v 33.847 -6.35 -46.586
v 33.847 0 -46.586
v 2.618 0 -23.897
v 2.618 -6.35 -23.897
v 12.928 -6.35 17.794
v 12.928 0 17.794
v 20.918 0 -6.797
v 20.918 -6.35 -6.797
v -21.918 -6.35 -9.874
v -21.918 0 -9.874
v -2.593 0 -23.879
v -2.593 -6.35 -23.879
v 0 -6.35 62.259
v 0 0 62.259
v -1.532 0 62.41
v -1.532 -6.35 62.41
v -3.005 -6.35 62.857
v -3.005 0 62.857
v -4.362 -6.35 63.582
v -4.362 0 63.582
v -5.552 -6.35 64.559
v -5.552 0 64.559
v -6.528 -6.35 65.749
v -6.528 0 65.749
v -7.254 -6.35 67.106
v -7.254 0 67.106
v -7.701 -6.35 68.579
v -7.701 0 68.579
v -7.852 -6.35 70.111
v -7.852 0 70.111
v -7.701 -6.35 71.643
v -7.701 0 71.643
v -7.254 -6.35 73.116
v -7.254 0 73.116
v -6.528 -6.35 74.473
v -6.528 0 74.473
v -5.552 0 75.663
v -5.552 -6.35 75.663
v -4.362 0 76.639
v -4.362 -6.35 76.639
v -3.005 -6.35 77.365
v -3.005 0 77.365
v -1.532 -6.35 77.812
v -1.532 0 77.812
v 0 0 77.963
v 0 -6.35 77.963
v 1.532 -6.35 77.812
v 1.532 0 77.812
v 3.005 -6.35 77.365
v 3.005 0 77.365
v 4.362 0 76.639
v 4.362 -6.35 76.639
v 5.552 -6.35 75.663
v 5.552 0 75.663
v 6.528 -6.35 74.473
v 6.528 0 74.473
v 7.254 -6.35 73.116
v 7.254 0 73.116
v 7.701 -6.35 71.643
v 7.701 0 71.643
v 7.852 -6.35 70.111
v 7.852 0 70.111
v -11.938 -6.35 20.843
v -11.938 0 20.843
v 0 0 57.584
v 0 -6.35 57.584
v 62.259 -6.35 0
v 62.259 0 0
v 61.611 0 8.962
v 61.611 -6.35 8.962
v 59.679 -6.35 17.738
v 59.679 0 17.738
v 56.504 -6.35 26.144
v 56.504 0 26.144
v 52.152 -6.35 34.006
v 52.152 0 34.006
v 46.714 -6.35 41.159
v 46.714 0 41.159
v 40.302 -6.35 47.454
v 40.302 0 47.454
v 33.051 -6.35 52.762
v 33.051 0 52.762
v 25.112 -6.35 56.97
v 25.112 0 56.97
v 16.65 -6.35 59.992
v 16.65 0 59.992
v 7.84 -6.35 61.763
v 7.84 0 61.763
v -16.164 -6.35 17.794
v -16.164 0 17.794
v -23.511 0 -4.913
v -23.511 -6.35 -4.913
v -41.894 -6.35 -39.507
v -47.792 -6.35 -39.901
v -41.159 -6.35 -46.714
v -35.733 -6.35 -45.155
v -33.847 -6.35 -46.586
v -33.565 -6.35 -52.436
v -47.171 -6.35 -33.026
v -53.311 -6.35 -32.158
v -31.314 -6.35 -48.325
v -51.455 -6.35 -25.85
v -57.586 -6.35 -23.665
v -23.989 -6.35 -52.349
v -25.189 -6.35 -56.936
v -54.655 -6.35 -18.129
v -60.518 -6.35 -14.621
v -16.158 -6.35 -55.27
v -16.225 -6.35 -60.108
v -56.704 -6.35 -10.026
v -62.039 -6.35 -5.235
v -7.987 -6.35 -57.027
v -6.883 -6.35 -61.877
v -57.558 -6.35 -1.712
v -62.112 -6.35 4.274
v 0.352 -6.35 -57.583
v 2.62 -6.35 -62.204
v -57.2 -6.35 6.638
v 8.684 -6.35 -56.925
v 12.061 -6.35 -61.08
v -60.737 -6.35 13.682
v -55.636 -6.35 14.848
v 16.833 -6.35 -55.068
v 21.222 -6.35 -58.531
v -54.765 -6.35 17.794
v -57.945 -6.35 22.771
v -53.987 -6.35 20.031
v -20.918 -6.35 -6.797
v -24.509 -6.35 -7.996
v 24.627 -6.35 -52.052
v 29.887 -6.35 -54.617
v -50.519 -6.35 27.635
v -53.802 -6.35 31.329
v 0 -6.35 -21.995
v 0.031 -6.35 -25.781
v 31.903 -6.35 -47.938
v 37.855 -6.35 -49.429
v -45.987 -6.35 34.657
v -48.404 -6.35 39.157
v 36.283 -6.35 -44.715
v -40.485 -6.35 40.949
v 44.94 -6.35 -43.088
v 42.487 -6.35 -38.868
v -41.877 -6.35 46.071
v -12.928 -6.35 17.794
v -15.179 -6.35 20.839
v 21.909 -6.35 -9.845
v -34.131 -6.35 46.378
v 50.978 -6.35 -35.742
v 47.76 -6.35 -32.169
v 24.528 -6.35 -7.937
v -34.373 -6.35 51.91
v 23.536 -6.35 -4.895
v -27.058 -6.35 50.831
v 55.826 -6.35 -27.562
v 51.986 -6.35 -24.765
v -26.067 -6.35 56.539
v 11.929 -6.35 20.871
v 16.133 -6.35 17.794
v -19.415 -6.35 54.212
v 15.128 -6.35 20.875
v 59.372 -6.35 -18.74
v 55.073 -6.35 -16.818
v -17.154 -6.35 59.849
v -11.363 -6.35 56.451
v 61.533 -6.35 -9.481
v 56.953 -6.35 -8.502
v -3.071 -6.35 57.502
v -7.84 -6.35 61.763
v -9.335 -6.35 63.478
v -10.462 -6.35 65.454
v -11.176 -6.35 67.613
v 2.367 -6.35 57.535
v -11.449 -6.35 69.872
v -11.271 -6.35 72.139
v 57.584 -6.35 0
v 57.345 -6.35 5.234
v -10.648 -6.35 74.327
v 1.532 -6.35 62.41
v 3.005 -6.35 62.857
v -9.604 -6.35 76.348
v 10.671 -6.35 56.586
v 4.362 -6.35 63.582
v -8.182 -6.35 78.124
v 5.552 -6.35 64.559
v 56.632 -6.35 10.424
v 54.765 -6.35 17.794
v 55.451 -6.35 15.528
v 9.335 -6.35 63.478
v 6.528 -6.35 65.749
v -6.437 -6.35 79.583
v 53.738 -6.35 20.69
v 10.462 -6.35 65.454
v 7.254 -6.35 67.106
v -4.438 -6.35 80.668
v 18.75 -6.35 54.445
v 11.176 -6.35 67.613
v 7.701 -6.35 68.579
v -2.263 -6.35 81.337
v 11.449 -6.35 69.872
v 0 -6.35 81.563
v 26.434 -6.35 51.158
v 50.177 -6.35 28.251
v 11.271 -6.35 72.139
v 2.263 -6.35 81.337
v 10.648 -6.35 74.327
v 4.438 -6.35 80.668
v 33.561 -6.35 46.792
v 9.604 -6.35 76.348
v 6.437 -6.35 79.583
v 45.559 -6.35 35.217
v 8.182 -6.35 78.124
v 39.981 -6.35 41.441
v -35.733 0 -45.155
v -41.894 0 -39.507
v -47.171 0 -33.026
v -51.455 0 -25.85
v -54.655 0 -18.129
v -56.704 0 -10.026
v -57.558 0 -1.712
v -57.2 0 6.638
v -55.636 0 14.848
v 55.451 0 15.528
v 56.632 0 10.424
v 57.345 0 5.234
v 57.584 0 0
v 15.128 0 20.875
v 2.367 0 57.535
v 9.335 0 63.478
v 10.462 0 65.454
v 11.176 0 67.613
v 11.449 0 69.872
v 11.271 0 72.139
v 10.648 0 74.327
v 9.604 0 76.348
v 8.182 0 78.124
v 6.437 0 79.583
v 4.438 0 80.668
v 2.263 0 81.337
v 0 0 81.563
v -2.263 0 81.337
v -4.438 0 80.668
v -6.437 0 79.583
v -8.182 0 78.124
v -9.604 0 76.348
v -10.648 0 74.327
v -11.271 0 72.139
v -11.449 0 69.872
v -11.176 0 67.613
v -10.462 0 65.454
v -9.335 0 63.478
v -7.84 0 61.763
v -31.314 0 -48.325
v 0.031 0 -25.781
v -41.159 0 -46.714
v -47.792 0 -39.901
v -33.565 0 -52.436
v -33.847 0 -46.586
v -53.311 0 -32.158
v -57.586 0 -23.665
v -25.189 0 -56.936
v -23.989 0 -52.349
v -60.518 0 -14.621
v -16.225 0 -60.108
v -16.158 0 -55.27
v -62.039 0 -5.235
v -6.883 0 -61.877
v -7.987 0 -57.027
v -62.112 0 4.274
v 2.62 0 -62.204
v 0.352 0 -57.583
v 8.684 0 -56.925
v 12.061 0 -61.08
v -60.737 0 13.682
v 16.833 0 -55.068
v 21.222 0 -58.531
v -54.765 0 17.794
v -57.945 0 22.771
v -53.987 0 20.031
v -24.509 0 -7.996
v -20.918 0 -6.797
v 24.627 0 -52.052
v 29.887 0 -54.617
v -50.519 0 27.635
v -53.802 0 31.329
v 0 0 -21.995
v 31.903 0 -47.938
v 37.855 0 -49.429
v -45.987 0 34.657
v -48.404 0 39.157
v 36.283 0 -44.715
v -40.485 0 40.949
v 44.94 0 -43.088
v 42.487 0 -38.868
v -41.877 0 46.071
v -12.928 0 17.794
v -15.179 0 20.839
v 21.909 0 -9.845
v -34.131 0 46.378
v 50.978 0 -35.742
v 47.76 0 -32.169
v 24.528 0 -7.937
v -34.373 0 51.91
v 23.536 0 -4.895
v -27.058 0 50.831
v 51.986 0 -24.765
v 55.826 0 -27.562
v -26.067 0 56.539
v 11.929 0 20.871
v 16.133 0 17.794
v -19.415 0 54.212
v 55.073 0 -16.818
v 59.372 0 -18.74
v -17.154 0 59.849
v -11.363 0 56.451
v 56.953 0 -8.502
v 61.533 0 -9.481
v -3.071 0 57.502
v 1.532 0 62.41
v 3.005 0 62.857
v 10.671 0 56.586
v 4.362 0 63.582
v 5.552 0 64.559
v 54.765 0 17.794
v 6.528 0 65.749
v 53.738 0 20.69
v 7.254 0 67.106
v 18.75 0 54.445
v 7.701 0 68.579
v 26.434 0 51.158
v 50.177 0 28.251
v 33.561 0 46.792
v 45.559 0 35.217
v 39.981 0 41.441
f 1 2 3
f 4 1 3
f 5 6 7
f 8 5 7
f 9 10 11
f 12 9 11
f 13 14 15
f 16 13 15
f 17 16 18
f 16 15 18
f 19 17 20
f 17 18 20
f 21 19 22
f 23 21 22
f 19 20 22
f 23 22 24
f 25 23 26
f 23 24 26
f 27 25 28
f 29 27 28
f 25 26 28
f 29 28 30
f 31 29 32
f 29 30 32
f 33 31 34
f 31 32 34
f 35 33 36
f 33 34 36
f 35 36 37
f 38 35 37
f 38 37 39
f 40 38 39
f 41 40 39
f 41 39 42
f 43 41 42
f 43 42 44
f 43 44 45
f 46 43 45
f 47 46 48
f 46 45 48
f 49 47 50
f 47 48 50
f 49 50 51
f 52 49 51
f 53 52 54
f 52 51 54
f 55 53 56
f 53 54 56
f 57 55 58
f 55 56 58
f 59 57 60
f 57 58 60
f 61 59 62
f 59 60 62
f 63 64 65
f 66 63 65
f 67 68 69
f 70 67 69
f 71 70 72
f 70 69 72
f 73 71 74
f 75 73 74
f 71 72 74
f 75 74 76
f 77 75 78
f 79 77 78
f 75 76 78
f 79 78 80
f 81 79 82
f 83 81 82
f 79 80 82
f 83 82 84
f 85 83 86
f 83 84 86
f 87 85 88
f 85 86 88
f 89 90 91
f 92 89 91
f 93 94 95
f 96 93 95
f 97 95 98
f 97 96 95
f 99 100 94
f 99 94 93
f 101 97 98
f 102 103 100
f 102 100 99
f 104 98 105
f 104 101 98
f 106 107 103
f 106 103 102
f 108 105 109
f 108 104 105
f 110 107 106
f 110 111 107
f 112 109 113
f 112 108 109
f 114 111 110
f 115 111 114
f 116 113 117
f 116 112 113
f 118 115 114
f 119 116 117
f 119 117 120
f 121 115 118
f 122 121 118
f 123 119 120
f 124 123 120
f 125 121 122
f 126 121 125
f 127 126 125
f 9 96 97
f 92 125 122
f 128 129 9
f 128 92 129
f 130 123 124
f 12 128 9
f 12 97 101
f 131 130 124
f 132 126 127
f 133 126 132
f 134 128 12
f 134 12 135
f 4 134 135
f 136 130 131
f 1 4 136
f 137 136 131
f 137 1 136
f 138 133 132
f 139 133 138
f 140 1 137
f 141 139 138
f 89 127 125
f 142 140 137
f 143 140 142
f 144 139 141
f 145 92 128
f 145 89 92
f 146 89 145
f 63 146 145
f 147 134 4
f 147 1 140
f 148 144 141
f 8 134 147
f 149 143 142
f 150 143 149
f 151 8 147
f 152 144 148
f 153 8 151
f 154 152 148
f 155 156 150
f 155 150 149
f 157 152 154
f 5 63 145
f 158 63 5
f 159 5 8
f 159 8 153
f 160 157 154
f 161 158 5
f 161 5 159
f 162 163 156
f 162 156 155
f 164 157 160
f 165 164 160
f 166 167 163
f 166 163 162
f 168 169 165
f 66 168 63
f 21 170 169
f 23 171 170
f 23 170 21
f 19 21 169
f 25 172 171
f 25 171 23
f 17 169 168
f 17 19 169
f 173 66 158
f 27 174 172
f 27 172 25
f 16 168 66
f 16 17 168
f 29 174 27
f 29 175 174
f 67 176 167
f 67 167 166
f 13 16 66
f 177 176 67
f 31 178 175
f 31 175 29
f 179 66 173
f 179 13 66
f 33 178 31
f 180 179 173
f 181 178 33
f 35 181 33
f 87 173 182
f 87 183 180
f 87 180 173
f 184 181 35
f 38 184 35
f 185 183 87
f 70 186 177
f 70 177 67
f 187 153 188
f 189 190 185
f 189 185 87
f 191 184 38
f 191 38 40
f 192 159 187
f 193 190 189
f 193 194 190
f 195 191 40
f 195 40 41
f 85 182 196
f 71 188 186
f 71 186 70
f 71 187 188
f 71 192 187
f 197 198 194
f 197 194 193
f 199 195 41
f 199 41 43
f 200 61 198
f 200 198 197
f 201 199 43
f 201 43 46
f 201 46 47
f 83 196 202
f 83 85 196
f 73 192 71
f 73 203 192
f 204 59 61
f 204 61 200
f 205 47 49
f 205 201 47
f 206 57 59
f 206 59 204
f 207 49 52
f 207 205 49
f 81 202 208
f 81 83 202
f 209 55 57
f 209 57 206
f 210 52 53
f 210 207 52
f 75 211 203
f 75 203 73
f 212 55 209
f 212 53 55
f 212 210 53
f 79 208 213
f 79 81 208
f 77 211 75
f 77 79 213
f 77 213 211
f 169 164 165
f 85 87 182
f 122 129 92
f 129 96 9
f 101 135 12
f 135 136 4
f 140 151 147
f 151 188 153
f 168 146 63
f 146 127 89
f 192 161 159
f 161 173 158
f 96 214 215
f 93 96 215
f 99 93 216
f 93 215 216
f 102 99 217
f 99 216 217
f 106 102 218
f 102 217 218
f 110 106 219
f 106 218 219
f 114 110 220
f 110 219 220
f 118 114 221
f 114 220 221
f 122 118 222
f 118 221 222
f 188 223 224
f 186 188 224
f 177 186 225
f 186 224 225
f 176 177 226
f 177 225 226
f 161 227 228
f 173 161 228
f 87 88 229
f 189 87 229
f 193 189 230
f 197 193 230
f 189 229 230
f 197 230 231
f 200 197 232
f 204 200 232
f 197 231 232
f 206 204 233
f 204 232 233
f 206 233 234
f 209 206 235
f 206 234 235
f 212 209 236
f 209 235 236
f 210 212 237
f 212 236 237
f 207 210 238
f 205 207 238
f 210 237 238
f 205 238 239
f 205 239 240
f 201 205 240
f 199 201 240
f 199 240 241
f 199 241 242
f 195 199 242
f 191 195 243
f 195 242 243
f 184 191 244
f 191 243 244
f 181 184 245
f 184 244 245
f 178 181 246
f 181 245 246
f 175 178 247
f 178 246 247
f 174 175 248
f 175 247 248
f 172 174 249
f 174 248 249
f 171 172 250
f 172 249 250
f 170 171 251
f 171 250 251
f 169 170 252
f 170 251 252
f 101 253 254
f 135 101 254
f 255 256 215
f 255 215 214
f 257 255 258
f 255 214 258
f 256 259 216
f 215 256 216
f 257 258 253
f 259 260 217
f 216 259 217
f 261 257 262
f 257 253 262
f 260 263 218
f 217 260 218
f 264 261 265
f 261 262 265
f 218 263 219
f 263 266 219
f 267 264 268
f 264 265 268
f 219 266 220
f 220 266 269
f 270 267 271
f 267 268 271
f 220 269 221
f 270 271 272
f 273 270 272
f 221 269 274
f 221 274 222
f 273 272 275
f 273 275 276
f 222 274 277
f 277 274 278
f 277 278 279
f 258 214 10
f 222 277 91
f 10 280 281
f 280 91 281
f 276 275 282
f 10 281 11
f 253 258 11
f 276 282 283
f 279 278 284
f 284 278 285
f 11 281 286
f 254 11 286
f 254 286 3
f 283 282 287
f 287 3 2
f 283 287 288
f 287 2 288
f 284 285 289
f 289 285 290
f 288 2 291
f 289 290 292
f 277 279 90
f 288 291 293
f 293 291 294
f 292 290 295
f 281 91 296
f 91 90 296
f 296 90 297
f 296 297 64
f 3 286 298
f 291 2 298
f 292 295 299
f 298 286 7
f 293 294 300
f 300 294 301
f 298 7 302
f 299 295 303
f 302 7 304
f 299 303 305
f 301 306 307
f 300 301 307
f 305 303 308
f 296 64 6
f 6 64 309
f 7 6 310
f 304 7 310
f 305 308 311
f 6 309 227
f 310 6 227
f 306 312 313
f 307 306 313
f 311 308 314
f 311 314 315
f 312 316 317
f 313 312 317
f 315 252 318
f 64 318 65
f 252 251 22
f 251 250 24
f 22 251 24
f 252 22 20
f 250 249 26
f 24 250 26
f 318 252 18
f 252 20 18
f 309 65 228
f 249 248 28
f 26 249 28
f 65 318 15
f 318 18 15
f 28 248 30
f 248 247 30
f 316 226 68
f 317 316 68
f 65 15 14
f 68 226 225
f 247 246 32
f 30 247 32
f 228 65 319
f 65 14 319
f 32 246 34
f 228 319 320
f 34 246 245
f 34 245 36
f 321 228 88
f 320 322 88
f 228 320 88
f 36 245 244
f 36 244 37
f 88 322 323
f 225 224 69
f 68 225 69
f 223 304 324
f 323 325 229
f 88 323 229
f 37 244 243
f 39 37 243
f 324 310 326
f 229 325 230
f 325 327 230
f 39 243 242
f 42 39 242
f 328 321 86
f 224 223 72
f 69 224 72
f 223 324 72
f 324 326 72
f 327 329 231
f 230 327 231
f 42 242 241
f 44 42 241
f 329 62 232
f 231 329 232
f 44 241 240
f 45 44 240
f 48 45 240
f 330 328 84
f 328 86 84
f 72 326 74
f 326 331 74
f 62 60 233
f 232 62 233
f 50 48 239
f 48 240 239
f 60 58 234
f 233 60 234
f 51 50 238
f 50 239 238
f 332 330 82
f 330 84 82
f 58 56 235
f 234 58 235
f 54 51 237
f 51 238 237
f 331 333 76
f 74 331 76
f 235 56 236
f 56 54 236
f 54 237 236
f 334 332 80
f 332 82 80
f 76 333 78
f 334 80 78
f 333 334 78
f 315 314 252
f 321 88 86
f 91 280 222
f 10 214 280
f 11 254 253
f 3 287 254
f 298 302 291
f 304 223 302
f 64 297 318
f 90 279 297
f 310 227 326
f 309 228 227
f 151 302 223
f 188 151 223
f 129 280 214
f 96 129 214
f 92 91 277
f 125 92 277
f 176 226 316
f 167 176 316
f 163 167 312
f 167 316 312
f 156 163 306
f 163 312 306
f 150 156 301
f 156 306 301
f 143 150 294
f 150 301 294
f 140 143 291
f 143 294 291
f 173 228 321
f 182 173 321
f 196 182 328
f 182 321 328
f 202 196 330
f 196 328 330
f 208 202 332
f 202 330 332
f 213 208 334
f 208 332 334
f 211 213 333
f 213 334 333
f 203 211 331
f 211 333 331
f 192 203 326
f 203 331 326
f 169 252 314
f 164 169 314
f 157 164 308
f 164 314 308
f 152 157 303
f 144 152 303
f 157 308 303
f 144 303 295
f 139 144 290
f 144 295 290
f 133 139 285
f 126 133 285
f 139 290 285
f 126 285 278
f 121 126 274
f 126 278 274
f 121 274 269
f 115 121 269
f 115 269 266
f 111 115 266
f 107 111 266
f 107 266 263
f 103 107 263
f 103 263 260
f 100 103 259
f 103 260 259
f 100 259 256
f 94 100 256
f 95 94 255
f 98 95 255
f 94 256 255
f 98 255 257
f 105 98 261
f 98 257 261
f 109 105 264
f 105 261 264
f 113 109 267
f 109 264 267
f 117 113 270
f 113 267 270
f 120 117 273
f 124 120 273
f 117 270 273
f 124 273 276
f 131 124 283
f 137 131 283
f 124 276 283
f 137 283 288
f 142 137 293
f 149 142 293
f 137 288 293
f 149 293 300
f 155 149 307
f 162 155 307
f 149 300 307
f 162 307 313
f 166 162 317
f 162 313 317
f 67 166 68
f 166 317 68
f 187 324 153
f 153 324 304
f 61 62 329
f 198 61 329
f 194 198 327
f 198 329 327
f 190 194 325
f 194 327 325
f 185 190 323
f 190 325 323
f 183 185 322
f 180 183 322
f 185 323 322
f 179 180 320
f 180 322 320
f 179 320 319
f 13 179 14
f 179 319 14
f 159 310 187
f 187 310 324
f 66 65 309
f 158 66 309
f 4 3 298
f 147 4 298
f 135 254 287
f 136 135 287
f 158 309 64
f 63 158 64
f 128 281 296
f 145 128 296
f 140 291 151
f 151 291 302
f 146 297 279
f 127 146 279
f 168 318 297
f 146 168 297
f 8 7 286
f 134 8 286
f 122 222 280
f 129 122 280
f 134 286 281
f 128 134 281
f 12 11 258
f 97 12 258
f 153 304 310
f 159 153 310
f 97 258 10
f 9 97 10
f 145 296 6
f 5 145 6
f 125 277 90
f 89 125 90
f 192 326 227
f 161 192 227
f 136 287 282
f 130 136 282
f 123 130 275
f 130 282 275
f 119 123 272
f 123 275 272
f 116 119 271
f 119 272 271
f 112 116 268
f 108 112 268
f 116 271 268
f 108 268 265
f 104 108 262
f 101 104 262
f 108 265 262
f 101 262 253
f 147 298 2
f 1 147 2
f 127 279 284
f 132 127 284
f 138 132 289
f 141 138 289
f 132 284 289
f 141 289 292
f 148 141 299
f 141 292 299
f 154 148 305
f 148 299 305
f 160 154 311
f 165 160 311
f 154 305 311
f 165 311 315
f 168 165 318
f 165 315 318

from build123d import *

# Parameters (mm, degrees)
F1_DEPTH = 6.35


with BuildPart() as f1:
    # F0 (on Front) → F1 (new body)
    with BuildSketch(Plane.XZ):
        with BuildLine():
            ThreePointArc((-7.8402373447, 61.7634878521), (-41.1586655068, -46.7136169332), (62.2591178325, 0))
            ThreePointArc((62.2591178325, 0), (46.7136169332, 41.1586655068), (7.8402373447, 61.7634878521))
            ThreePointArc((7.8402373447, 61.7634878521), (0, 58.6588690032), (-7.8402373447, 61.7634878521))
        make_face()
        with BuildLine():
            ThreePointArc((55.4505510699, 15.5277837924), (57.0478759304, 7.8368064468), (57.5836407625, 0))
            ThreePointArc((57.5836407625, 0), (51.9864857424, -24.7645105668), (36.2831125051, -44.7147786576))
            ThreePointArc((36.2831125051, -44.7147786576), (35.0774454381, -45.6667111252), (33.8468148135, -46.5861439748))
            ThreePointArc((33.8468148135, -46.5861439748), (32.8818393757, -47.27219397), (31.9029625874, -47.9382588504))
            ThreePointArc((31.9029625874, -47.9382588504), (0.3521951536, -57.582563698), (-31.3141832441, -48.3249170844))
            ThreePointArc((-31.3141832441, -48.3249170844), (-32.5920964338, -47.4724228738), (-33.8468148135, -46.5861439748))
            ThreePointArc((-33.8468148135, -46.5861439748), (-34.7974809413, -45.8803989041), (-35.7334358491, -45.1552571234))
            ThreePointArc((-35.7334358491, -45.1552571234), (-54.6554381422, -18.1289482582), (-55.6363420799, 14.848337396))
            ThreePointArc((-55.6363420799, 14.848337396), (-55.2204687988, 16.3271402609), (-54.7652967791, 17.7943235936))
            ThreePointArc((-54.7652967791, 17.7943235936), (-54.3878653203, 18.9165480298), (-53.987440477, 20.0307751774))
            ThreePointArc((-53.987440477, 20.0307751774), (-34.1311135955, 46.3782574941), (-3.070967171, 57.5016942715))
            ThreePointArc((-3.070967171, 57.5016942715), (-1.5360301586, 57.5631504942), (0, 57.5836407625))
            ThreePointArc((0, 57.5836407625), (1.1839315978, 57.5714685364), (2.3673626687, 57.534957004))
            ThreePointArc((2.3673626687, 57.534957004), (33.5612498663, 46.7922877286), (53.7383799899, 20.6896640745))
            ThreePointArc((53.7383799899, 20.6896640745), (54.2711499531, 19.248843244), (54.7652967791, 17.7943235936))
            ThreePointArc((54.7652967791, 17.7943235936), (55.1195752881, 16.6645763079), (55.4505510699, 15.5277837924))
        make_face(mode=Mode.SUBTRACT)
        with BuildLine():
            ThreePointArc((3.19e-08, 62.2591178325), (3.9279438387, 62.1350867906), (7.8402373447, 61.7634878521))
            ThreePointArc((7.8402373447, 61.7634878521), (10.5103201859, 65.5632316042), (11.4519661318, 70.110835135))
            ThreePointArc((11.4519661318, 70.110835135), (-4.5476035308, 80.6211553209), (-7.8402373447, 61.7634878521))
            ThreePointArc((-7.8402373447, 61.7634878521), (-3.9279438068, 62.1350867926), (3.19e-08, 62.2591178325))
        make_face()
        with BuildLine():
            ThreePointArc((7.8517173025, 70.110835135), (5.5520025598, 64.5588325977), (3.19e-08, 62.2591178325))
            ThreePointArc((3.19e-08, 62.2591178325), (-5.5520025598, 75.6628376722), (7.8517173025, 70.110835135))
        make_face(mode=Mode.SUBTRACT)
        with BuildLine():
            Line((16.1334199845, 17.7943235936), (54.7652967791, 17.7943235936))
            ThreePointArc((54.7652967791, 17.7943235936), (54.2711499531, 19.248843244), (53.7383799899, 20.6896640745))
            Line((53.7383799899, 20.6896640745), (15.1282112975, 20.8753324215))
            Line((15.1282112975, 20.8753324215), (16.1334199845, 17.7943235936))
        make_face()
        with BuildLine():
            ThreePointArc((33.8468148135, -46.5861439748), (35.0774454381, -45.6667111252), (36.2831125051, -44.7147786576))
            Line((36.2831125051, -44.7147786576), (24.5284953147, -7.9369514529))
            Line((24.5284953147, -7.9369514529), (21.9089083593, -9.8450458125))
            Line((21.9089083593, -9.8450458125), (33.8468148135, -46.5861439748))
        make_face()
        with BuildLine():
            Line((-11.9379064542, 20.8425426002), (0, 57.5836407625))
            ThreePointArc((0, 57.5836407625), (-1.5360301586, 57.5631504942), (-3.070967171, 57.5016942715))
            Line((-3.070967171, 57.5016942715), (-15.1787465438, 20.8386164159))
            Line((-15.1787465438, 20.8386164159), (-11.9379064542, 20.8425426002))
        make_face()
        with BuildLine():
            Line((-24.5091925682, -7.9963591979), (-23.5114519277, -4.9129238547))
            Line((-23.5114519277, -4.9129238547), (-54.7652967791, 17.7943235936))
            ThreePointArc((-54.7652967791, 17.7943235936), (-55.2204687988, 16.3271402609), (-55.6363420799, 14.848337396))
            Line((-55.6363420799, 14.848337396), (-24.5091925682, -7.9963591979))
        make_face()
        with BuildLine():
            ThreePointArc((-33.8468148135, -46.5861439748), (-32.5920964338, -47.4724228738), (-31.3141832441, -48.3249170844))
            Line((-31.3141832441, -48.3249170844), (0.0312324998, -25.7806381864))
            Line((0.0312324998, -25.7806381864), (-2.592969962, -23.8788965265))
            Line((-2.592969962, -23.8788965265), (-33.8468148135, -46.5861439748))
        make_face()
        with BuildLine():
            Line((24.5284953147, -7.9369514529), (55.4505510699, 15.5277837924))
            ThreePointArc((55.4505510699, 15.5277837924), (55.1195752881, 16.6645763079), (54.7652967791, 17.7943235936))
            Line((54.7652967791, 17.7943235936), (23.5360472008, -4.8950543427))
            Line((23.5360472008, -4.8950543427), (24.5284953147, -7.9369514529))
        make_face()
        with BuildLine():
            Line((15.1282112975, 20.8753324215), (2.3673626687, 57.534957004))
            ThreePointArc((2.3673626687, 57.534957004), (1.1839315978, 57.5714685364), (0, 57.5836407625))
            Line((0, 57.5836407625), (11.9285118958, 20.8714560779))
            Line((11.9285118958, 20.8714560779), (15.1282112975, 20.8753324215))
        make_face()
        with BuildLine():
            Line((-54.7652967791, 17.7943235936), (-16.1638214141, 17.7943235936))
            Line((-16.1638214141, 17.7943235936), (-15.1787465438, 20.8386164159))
            Line((-15.1787465438, 20.8386164159), (-53.987440477, 20.0307751774))
            ThreePointArc((-53.987440477, 20.0307751774), (-54.3878653203, 18.9165480298), (-54.7652967791, 17.7943235936))
        make_face()
        with BuildLine():
            ThreePointArc((-35.7334358491, -45.1552571234), (-34.7974809413, -45.8803989041), (-33.8468148135, -46.5861439748))
            Line((-33.8468148135, -46.5861439748), (-21.9183029177, -9.8739592902))
            Line((-21.9183029177, -9.8739592902), (-24.5091925682, -7.9963591979))
            Line((-24.5091925682, -7.9963591979), (-35.7334358491, -45.1552571234))
        make_face()
        with BuildLine():
            ThreePointArc((31.9029625874, -47.9382588504), (32.8818393757, -47.27219397), (33.8468148135, -46.5861439748))
            Line((33.8468148135, -46.5861439748), (2.6175652352, -23.8967660385))
            Line((2.6175652352, -23.8967660385), (0.0312324998, -25.7806381864))
            Line((0.0312324998, -25.7806381864), (31.9029625874, -47.9382588504))
        make_face()
        Polygon((23.5360472008, -4.8950543427), (16.1334199845, 17.7943235936), (12.9283328478, 17.7943235936), (20.9184819657, -6.7968268059), align=None)
        Polygon((2.6175652352, -23.8967660385), (21.9089083593, -9.8450458125), (20.9184819657, -6.7968268059), (0, -21.9949935753), align=None)
        Polygon((-12.9283328478, 17.7943235936), (12.9283328478, 17.7943235936), (11.9285118958, 20.8714560779), (-11.9379064542, 20.8425426002), align=None)
        Polygon((-20.9184819657, -6.7968268059), (-12.9283328478, 17.7943235936), (-16.1638214141, 17.7943235936), (-23.5114519277, -4.9129238547), align=None)
        Polygon((-2.592969962, -23.8788965265), (0, -21.9949935753), (-20.9184819657, -6.7968268059), (-21.9183029177, -9.8739592902), align=None)
        with BuildLine():
            ThreePointArc((-7.8402373447, 61.7634878521), (0, 58.6588690032), (7.8402373447, 61.7634878521))
            ThreePointArc((7.8402373447, 61.7634878521), (3.9279438387, 62.1350867906), (3.19e-08, 62.2591178325))
            ThreePointArc((3.19e-08, 62.2591178325), (-3.9279438068, 62.1350867926), (-7.8402373447, 61.7634878521))
        make_face()
        Polygon((21.9089083593, -9.8450458125), (24.5284953147, -7.9369514529), (23.5360472008, -4.8950543427), (20.9184819657, -6.7968268059), align=None)
        Polygon((12.9283328478, 17.7943235936), (16.1334199845, 17.7943235936), (15.1282112975, 20.8753324215), (11.9285118958, 20.8714560779), align=None)
        Polygon((-16.1638214141, 17.7943235936), (-12.9283328478, 17.7943235936), (-11.9379064542, 20.8425426002), (-15.1787465438, 20.8386164159), align=None)
        Polygon((-21.9183029177, -9.8739592902), (-20.9184819657, -6.7968268059), (-23.5114519277, -4.9129238547), (-24.5091925682, -7.9963591979), align=None)
        Polygon((0.0312324998, -25.7806381864), (2.6175652352, -23.8967660385), (0, -21.9949935753), (-2.592969962, -23.8788965265), align=None)
    extrude(amount=F1_DEPTH)


solid = f1.part
